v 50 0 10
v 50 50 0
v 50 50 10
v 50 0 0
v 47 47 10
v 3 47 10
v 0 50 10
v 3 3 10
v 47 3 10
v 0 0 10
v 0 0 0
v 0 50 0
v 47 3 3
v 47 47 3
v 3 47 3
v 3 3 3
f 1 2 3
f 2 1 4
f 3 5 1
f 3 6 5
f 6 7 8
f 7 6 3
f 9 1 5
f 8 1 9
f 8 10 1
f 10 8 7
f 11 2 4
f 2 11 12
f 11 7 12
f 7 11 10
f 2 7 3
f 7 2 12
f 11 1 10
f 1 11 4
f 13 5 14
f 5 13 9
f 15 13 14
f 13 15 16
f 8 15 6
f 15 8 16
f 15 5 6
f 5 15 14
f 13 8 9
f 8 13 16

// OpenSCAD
// Generated by HEIDI for job job_1787720261151_63ed7035
// Product: 3D-Printable Model Preparation Package
// Request: E2E production path qualification test — automated cleanup expected
// Model type: box
// Generated: 2026-09-07T04:35:14.890Z
//
// This is a parameterized OpenSCAD model. You can adjust the
// parameters below to customize the dimensions before rendering.

// ─── Parameters ───
width = 50;       // X dimension in mm
height = 50;     // Y dimension in mm
depth = 10;       // Z dimension in mm
wall = 3;    // wall thickness in mm
$fn = 60;               // facet resolution

// Parametric hollow box
module parametric_box() {
    difference() {
        // Outer shell
        cube([width, height, depth]);
        // Inner cavity
        translate([wall, wall, wall])
            cube([width - wall * 2, height - wall * 2, depth - wall + 1]);
    }
}
parametric_box();
